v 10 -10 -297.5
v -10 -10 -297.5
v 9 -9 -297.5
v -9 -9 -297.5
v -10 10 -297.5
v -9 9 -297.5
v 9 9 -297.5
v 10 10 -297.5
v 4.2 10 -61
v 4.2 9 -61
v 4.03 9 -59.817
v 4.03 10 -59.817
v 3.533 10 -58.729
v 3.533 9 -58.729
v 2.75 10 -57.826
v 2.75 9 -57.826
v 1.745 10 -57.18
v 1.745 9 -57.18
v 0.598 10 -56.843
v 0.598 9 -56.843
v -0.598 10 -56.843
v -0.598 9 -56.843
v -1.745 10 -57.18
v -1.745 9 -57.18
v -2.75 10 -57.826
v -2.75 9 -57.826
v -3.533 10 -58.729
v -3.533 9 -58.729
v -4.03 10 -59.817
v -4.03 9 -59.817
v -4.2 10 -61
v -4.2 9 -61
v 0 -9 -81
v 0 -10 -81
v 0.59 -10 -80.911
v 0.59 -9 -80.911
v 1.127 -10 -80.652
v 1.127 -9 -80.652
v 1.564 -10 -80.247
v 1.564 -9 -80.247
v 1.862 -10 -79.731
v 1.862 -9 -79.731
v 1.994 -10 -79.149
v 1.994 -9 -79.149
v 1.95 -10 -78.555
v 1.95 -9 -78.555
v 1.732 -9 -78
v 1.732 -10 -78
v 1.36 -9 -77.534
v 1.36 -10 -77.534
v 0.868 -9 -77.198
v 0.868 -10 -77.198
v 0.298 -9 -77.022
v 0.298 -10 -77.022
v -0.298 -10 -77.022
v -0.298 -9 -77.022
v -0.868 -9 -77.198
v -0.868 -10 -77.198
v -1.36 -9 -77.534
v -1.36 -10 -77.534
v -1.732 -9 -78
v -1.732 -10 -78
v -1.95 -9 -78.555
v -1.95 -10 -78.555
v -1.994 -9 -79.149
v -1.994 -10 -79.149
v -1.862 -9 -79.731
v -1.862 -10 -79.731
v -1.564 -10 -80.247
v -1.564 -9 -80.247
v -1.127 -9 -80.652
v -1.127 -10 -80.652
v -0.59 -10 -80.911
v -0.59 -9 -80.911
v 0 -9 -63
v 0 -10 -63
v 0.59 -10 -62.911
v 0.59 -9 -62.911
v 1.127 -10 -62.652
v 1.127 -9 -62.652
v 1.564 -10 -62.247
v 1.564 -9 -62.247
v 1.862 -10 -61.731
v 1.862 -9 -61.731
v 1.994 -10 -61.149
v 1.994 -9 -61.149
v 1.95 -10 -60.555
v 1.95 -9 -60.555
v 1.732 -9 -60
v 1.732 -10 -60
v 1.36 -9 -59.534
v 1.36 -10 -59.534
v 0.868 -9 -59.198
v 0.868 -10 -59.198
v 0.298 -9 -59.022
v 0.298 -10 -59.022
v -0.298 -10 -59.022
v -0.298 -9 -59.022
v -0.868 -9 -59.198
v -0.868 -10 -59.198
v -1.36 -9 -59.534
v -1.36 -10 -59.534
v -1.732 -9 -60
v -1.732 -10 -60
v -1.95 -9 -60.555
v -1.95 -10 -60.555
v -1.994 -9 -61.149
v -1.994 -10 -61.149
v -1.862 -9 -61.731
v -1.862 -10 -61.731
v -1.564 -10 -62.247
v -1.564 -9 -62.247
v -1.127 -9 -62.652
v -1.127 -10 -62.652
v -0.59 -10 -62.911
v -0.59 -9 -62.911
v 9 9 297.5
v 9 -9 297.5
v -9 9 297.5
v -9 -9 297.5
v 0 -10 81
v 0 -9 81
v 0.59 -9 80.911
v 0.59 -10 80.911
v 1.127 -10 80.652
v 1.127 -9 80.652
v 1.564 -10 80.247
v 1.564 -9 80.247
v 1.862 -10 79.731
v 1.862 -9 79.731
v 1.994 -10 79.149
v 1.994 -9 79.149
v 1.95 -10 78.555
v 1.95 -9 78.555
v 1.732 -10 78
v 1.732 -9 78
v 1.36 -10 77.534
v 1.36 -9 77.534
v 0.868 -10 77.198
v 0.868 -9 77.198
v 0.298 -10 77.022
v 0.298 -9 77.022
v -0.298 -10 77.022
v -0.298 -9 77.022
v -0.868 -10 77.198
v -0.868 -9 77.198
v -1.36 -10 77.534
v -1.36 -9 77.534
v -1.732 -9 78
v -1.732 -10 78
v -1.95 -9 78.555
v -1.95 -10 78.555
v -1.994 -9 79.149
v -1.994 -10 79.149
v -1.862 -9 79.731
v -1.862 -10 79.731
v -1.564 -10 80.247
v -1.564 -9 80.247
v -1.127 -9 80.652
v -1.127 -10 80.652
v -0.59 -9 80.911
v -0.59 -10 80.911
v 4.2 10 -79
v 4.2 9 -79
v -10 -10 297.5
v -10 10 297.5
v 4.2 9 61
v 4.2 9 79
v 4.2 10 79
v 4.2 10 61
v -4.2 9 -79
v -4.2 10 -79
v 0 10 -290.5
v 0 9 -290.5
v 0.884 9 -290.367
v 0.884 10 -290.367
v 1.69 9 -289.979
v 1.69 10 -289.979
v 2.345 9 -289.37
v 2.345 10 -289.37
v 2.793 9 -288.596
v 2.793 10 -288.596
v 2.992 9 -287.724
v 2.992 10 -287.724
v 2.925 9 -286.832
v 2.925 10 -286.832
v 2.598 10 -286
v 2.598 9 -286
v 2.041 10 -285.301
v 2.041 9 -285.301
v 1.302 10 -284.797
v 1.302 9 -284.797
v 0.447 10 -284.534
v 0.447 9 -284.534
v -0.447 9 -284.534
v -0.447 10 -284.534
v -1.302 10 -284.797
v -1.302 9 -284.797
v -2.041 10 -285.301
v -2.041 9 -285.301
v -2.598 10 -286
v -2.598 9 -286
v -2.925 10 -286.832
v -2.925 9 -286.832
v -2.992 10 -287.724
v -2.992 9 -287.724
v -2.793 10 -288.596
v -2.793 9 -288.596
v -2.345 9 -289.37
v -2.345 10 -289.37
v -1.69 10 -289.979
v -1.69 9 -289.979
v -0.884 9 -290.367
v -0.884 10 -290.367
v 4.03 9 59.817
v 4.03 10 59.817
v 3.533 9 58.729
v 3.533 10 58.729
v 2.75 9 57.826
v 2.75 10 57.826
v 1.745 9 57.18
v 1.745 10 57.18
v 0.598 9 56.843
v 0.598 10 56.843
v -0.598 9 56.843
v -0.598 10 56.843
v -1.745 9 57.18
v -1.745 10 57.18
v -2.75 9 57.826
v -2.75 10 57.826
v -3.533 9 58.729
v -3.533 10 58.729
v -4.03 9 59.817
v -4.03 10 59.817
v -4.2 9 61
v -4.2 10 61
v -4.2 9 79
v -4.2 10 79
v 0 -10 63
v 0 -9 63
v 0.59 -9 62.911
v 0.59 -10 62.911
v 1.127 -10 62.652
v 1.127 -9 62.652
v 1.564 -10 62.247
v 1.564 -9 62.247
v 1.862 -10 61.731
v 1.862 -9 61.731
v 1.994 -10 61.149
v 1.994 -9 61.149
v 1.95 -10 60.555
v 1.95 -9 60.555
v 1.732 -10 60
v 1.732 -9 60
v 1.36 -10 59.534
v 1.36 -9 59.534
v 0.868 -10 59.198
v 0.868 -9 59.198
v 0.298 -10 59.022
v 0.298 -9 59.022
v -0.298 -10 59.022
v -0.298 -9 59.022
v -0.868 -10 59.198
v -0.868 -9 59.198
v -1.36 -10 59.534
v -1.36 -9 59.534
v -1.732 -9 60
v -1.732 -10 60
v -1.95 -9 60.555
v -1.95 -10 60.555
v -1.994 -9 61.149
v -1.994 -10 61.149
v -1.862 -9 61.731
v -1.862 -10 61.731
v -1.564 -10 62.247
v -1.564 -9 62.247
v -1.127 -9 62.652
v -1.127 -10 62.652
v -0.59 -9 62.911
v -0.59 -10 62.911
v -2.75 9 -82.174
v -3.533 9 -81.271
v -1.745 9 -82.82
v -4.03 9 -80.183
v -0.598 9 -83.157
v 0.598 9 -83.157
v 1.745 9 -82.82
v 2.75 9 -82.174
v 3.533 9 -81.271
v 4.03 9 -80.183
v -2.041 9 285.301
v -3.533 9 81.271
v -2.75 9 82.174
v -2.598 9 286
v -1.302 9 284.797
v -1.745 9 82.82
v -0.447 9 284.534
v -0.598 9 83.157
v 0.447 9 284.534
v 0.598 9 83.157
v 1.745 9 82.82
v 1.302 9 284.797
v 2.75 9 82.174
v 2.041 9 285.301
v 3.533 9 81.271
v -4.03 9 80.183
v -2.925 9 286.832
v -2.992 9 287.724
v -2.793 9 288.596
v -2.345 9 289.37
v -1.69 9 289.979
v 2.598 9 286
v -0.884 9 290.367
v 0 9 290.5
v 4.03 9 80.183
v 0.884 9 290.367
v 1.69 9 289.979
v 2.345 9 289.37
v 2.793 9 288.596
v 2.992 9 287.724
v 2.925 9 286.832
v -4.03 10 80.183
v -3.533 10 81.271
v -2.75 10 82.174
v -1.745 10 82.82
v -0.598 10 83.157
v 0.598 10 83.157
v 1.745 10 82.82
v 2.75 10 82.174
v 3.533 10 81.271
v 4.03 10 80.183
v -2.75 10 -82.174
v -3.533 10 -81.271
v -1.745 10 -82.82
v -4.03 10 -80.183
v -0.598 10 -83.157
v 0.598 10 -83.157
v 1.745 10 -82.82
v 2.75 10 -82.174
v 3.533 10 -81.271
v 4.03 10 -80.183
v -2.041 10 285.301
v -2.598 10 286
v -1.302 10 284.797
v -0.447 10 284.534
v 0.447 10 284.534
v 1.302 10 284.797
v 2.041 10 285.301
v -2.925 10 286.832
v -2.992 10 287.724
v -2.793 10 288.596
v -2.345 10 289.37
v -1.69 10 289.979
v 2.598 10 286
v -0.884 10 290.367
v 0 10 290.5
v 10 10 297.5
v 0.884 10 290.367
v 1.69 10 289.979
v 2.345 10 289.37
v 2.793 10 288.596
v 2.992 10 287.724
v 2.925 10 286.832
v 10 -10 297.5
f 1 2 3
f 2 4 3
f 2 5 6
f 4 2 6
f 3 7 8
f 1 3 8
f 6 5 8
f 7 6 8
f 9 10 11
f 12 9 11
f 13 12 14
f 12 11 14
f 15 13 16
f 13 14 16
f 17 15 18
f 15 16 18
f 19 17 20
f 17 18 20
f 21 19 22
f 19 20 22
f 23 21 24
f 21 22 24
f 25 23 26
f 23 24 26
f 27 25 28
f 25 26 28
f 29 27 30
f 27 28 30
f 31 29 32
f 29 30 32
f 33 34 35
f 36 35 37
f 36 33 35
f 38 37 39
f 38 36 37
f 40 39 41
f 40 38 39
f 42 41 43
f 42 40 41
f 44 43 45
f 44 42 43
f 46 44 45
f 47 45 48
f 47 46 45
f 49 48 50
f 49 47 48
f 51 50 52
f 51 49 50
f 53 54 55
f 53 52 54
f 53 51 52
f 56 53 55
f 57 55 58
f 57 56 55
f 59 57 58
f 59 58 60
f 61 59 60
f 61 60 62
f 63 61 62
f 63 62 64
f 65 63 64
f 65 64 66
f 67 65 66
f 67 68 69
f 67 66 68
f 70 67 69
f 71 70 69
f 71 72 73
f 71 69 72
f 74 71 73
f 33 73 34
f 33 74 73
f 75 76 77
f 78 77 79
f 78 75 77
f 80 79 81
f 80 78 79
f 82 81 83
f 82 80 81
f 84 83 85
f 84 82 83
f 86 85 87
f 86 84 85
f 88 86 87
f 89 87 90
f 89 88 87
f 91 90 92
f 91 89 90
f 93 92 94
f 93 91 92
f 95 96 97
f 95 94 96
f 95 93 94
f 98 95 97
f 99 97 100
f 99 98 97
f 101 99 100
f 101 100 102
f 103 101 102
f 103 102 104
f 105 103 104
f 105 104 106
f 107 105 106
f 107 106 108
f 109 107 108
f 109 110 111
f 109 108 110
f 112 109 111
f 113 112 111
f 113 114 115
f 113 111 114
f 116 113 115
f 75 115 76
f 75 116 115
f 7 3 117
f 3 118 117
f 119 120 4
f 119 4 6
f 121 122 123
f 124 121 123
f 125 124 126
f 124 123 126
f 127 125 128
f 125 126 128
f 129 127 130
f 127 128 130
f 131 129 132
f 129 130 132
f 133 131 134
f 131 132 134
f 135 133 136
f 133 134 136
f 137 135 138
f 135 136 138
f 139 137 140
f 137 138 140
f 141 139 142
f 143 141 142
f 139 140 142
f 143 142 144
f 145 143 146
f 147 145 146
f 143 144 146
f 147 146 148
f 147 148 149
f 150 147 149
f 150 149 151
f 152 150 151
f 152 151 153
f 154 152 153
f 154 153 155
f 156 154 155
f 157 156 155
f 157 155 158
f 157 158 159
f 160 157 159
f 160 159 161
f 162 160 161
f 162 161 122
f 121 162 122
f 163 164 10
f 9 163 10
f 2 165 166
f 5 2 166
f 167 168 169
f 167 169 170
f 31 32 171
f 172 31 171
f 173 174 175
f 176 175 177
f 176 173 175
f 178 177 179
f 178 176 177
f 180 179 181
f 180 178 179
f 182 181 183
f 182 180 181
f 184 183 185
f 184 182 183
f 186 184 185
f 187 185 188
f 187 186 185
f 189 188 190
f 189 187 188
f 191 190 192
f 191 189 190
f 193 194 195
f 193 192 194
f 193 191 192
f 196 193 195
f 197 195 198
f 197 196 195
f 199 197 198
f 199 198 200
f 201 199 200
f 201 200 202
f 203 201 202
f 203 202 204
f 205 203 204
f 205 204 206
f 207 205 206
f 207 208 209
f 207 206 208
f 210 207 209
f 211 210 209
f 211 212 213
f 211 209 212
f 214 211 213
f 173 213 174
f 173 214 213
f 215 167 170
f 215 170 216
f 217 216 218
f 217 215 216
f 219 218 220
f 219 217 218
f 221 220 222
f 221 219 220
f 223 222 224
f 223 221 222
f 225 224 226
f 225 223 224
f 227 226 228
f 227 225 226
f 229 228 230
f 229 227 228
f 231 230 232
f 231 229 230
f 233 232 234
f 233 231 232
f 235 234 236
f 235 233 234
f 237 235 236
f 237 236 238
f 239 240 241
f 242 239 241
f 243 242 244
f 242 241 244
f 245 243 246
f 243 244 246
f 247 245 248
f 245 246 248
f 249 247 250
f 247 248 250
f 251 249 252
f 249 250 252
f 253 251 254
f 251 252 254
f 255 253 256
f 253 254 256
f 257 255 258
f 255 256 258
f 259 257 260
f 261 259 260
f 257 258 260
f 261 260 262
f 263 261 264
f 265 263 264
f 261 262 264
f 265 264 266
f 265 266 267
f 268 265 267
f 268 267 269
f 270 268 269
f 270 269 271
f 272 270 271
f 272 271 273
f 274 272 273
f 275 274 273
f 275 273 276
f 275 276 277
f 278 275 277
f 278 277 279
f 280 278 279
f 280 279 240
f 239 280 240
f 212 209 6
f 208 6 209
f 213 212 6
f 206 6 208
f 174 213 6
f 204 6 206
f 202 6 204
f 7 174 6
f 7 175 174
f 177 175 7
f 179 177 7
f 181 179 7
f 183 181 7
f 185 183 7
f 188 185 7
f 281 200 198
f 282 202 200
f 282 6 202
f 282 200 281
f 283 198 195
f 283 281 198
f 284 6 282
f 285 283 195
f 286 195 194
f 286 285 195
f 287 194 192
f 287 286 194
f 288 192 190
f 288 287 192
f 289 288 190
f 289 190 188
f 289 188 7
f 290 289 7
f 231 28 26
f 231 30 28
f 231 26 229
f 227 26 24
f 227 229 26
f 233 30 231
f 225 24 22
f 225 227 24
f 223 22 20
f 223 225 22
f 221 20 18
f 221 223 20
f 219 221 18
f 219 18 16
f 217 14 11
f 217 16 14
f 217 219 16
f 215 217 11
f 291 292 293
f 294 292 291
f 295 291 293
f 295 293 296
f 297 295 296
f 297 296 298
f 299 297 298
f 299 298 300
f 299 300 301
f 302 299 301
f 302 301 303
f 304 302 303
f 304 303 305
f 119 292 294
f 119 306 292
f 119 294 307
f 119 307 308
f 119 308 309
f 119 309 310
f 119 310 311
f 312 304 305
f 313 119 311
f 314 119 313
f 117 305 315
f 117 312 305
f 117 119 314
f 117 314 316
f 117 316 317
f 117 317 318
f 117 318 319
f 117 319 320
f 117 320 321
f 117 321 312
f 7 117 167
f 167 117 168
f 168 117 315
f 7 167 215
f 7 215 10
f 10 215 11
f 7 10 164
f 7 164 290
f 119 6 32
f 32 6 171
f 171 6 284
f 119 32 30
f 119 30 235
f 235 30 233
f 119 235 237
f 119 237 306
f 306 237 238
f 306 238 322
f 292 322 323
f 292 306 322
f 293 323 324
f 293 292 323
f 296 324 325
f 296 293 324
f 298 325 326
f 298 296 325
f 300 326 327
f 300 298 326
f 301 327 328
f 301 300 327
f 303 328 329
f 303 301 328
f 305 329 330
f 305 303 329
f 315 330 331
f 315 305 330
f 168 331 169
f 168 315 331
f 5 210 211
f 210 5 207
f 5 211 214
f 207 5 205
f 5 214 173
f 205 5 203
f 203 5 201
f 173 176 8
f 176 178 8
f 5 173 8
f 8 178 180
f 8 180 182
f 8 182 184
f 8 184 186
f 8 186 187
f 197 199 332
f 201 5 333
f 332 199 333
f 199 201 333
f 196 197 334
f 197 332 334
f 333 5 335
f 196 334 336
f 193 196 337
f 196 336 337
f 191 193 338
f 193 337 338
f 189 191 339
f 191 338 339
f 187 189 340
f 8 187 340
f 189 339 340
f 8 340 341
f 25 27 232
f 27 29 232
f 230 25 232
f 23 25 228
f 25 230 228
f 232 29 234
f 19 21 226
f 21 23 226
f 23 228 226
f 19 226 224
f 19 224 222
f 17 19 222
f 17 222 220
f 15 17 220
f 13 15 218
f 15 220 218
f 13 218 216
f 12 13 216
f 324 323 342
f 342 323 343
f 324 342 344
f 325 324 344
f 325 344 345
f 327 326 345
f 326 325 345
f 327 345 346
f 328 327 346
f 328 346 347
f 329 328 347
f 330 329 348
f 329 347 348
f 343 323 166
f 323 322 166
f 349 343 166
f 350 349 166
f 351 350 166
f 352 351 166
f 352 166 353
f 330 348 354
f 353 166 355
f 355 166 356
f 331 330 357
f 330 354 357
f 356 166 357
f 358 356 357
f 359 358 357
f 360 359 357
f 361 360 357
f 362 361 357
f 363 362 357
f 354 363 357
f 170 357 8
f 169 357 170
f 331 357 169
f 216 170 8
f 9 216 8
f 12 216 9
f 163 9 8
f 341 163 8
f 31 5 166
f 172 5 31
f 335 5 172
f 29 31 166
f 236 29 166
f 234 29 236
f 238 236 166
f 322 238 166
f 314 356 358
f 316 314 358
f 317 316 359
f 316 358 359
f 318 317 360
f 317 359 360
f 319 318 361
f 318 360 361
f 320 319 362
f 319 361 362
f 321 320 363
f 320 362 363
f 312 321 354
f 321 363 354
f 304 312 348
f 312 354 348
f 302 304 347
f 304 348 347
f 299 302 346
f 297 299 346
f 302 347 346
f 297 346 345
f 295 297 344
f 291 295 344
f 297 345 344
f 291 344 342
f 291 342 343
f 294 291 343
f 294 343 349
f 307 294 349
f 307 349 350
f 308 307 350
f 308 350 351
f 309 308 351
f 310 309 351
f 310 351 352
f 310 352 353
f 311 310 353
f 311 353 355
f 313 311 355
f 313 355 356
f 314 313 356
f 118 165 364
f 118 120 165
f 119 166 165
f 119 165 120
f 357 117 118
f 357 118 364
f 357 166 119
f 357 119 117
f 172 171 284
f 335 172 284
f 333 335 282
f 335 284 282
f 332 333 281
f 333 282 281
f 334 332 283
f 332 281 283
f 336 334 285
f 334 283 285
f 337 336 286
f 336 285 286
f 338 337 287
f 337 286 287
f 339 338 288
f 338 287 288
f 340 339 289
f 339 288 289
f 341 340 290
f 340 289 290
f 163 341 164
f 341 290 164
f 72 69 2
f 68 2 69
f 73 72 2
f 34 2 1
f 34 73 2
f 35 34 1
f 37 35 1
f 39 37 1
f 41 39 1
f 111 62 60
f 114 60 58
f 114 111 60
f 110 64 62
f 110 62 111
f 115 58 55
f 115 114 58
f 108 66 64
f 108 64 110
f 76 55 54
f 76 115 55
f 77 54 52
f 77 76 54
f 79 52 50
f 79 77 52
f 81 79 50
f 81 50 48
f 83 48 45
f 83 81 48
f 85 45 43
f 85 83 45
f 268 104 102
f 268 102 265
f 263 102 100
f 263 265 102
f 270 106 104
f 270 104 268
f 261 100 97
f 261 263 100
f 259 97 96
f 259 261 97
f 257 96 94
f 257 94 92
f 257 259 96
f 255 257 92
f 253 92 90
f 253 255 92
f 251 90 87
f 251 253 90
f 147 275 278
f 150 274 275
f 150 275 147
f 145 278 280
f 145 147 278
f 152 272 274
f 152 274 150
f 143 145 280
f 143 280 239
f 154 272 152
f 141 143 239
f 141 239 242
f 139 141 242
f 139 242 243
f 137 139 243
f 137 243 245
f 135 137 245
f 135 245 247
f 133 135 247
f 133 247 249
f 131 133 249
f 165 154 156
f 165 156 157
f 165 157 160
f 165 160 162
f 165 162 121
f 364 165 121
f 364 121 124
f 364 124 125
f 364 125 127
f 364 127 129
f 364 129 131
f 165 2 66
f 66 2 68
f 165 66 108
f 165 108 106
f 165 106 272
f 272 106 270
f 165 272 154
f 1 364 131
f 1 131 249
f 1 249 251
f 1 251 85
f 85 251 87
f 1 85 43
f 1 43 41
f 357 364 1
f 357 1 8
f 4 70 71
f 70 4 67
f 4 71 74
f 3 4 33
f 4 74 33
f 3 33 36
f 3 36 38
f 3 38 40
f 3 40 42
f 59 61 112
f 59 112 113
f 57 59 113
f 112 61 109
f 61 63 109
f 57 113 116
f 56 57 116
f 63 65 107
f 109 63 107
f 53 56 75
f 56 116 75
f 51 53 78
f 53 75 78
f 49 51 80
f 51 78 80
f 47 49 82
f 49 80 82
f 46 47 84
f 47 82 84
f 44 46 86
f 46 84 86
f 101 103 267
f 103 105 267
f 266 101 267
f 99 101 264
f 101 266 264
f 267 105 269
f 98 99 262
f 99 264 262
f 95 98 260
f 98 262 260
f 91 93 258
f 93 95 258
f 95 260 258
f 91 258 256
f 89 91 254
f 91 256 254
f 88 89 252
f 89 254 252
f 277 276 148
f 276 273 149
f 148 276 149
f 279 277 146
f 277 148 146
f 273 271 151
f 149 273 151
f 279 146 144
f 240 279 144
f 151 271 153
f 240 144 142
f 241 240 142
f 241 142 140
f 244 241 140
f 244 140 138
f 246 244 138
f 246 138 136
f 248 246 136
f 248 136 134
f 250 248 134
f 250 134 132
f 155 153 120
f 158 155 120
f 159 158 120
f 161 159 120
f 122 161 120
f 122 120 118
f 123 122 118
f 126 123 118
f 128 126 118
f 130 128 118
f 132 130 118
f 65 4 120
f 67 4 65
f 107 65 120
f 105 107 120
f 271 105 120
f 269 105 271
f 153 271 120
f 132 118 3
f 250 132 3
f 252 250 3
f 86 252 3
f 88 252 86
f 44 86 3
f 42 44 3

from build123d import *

# Parameters (mm, degrees)
SKETCH_1_W          = 20
SKETCH_1_H          = 20
SKETCH_1_W_2        = 18
SKETCH_1_H_2        = 18
EXTRUDE_1_DEPTH     = 297.5
SKETCH_2_R          = 3
CUT_EXTRUDE_1_DEPTH = 10
SKETCH_4_R          = 2
CUT_EXTRUDE_3_DEPTH = 10
CUT_EXTRUDE_4_DEPTH = 10


with BuildPart() as part:
    # 草图1 → 凸台-拉伸1 (new, symmetric)
    with BuildSketch(Plane.XY):
        Rectangle(SKETCH_1_W, SKETCH_1_H)
        Rectangle(SKETCH_1_W_2, SKETCH_1_H_2, mode=Mode.SUBTRACT)
    extrude(amount=EXTRUDE_1_DEPTH, both=True)

    # 草图2 → 切除-拉伸1 (cut)
    with BuildSketch(Plane(origin=(0, 10, 0), x_dir=(1, 0, 0), z_dir=(0, 1, 0))):
        with Locations(Location((0, -287.5, 0), (0, 0, 270))):
            Circle(SKETCH_2_R)
    cut_extrude_1 = extrude(amount=-CUT_EXTRUDE_1_DEPTH, mode=Mode.SUBTRACT)

    # 镜向1: 切除-拉伸1 across plane
    add(cut_extrude_1.mirror(Plane.XY), mode=Mode.SUBTRACT)

    # 草图4 → 切除-拉伸3 (cut)
    with BuildSketch(Plane(origin=(0, -9, 0), x_dir=(1, 0, 0), z_dir=(0, 1, 0))):
        with Locations(Location((0, -79, 0), (0, 0, 270))):
            Circle(SKETCH_4_R)
        with Locations(Location((0, -61, 0), (0, 0, 270))):
            Circle(SKETCH_4_R)
    cut_extrude_3 = extrude(amount=-CUT_EXTRUDE_3_DEPTH, mode=Mode.SUBTRACT)

    # 草图5 → 切除-拉伸4 (cut)
    with BuildSketch(Plane.XZ.offset(-9)):
        with BuildLine():
            Line((4.2, 79), (4.2, 61))
            ThreePointArc((4.2, 61), (0, 56.8), (-4.2, 61))
            Line((-4.2, 61), (-4.2, 79))
            ThreePointArc((-4.2, 79), (0, 83.2), (4.2, 79))
        make_face()
    cut_extrude_4 = extrude(amount=-CUT_EXTRUDE_4_DEPTH, mode=Mode.SUBTRACT)

    # 镜向2: 切除-拉伸3, 切除-拉伸4 across plane
    add(cut_extrude_3.mirror(Plane.XY), mode=Mode.SUBTRACT)
    add(cut_extrude_4.mirror(Plane.XY), mode=Mode.SUBTRACT)


solid = part.part
